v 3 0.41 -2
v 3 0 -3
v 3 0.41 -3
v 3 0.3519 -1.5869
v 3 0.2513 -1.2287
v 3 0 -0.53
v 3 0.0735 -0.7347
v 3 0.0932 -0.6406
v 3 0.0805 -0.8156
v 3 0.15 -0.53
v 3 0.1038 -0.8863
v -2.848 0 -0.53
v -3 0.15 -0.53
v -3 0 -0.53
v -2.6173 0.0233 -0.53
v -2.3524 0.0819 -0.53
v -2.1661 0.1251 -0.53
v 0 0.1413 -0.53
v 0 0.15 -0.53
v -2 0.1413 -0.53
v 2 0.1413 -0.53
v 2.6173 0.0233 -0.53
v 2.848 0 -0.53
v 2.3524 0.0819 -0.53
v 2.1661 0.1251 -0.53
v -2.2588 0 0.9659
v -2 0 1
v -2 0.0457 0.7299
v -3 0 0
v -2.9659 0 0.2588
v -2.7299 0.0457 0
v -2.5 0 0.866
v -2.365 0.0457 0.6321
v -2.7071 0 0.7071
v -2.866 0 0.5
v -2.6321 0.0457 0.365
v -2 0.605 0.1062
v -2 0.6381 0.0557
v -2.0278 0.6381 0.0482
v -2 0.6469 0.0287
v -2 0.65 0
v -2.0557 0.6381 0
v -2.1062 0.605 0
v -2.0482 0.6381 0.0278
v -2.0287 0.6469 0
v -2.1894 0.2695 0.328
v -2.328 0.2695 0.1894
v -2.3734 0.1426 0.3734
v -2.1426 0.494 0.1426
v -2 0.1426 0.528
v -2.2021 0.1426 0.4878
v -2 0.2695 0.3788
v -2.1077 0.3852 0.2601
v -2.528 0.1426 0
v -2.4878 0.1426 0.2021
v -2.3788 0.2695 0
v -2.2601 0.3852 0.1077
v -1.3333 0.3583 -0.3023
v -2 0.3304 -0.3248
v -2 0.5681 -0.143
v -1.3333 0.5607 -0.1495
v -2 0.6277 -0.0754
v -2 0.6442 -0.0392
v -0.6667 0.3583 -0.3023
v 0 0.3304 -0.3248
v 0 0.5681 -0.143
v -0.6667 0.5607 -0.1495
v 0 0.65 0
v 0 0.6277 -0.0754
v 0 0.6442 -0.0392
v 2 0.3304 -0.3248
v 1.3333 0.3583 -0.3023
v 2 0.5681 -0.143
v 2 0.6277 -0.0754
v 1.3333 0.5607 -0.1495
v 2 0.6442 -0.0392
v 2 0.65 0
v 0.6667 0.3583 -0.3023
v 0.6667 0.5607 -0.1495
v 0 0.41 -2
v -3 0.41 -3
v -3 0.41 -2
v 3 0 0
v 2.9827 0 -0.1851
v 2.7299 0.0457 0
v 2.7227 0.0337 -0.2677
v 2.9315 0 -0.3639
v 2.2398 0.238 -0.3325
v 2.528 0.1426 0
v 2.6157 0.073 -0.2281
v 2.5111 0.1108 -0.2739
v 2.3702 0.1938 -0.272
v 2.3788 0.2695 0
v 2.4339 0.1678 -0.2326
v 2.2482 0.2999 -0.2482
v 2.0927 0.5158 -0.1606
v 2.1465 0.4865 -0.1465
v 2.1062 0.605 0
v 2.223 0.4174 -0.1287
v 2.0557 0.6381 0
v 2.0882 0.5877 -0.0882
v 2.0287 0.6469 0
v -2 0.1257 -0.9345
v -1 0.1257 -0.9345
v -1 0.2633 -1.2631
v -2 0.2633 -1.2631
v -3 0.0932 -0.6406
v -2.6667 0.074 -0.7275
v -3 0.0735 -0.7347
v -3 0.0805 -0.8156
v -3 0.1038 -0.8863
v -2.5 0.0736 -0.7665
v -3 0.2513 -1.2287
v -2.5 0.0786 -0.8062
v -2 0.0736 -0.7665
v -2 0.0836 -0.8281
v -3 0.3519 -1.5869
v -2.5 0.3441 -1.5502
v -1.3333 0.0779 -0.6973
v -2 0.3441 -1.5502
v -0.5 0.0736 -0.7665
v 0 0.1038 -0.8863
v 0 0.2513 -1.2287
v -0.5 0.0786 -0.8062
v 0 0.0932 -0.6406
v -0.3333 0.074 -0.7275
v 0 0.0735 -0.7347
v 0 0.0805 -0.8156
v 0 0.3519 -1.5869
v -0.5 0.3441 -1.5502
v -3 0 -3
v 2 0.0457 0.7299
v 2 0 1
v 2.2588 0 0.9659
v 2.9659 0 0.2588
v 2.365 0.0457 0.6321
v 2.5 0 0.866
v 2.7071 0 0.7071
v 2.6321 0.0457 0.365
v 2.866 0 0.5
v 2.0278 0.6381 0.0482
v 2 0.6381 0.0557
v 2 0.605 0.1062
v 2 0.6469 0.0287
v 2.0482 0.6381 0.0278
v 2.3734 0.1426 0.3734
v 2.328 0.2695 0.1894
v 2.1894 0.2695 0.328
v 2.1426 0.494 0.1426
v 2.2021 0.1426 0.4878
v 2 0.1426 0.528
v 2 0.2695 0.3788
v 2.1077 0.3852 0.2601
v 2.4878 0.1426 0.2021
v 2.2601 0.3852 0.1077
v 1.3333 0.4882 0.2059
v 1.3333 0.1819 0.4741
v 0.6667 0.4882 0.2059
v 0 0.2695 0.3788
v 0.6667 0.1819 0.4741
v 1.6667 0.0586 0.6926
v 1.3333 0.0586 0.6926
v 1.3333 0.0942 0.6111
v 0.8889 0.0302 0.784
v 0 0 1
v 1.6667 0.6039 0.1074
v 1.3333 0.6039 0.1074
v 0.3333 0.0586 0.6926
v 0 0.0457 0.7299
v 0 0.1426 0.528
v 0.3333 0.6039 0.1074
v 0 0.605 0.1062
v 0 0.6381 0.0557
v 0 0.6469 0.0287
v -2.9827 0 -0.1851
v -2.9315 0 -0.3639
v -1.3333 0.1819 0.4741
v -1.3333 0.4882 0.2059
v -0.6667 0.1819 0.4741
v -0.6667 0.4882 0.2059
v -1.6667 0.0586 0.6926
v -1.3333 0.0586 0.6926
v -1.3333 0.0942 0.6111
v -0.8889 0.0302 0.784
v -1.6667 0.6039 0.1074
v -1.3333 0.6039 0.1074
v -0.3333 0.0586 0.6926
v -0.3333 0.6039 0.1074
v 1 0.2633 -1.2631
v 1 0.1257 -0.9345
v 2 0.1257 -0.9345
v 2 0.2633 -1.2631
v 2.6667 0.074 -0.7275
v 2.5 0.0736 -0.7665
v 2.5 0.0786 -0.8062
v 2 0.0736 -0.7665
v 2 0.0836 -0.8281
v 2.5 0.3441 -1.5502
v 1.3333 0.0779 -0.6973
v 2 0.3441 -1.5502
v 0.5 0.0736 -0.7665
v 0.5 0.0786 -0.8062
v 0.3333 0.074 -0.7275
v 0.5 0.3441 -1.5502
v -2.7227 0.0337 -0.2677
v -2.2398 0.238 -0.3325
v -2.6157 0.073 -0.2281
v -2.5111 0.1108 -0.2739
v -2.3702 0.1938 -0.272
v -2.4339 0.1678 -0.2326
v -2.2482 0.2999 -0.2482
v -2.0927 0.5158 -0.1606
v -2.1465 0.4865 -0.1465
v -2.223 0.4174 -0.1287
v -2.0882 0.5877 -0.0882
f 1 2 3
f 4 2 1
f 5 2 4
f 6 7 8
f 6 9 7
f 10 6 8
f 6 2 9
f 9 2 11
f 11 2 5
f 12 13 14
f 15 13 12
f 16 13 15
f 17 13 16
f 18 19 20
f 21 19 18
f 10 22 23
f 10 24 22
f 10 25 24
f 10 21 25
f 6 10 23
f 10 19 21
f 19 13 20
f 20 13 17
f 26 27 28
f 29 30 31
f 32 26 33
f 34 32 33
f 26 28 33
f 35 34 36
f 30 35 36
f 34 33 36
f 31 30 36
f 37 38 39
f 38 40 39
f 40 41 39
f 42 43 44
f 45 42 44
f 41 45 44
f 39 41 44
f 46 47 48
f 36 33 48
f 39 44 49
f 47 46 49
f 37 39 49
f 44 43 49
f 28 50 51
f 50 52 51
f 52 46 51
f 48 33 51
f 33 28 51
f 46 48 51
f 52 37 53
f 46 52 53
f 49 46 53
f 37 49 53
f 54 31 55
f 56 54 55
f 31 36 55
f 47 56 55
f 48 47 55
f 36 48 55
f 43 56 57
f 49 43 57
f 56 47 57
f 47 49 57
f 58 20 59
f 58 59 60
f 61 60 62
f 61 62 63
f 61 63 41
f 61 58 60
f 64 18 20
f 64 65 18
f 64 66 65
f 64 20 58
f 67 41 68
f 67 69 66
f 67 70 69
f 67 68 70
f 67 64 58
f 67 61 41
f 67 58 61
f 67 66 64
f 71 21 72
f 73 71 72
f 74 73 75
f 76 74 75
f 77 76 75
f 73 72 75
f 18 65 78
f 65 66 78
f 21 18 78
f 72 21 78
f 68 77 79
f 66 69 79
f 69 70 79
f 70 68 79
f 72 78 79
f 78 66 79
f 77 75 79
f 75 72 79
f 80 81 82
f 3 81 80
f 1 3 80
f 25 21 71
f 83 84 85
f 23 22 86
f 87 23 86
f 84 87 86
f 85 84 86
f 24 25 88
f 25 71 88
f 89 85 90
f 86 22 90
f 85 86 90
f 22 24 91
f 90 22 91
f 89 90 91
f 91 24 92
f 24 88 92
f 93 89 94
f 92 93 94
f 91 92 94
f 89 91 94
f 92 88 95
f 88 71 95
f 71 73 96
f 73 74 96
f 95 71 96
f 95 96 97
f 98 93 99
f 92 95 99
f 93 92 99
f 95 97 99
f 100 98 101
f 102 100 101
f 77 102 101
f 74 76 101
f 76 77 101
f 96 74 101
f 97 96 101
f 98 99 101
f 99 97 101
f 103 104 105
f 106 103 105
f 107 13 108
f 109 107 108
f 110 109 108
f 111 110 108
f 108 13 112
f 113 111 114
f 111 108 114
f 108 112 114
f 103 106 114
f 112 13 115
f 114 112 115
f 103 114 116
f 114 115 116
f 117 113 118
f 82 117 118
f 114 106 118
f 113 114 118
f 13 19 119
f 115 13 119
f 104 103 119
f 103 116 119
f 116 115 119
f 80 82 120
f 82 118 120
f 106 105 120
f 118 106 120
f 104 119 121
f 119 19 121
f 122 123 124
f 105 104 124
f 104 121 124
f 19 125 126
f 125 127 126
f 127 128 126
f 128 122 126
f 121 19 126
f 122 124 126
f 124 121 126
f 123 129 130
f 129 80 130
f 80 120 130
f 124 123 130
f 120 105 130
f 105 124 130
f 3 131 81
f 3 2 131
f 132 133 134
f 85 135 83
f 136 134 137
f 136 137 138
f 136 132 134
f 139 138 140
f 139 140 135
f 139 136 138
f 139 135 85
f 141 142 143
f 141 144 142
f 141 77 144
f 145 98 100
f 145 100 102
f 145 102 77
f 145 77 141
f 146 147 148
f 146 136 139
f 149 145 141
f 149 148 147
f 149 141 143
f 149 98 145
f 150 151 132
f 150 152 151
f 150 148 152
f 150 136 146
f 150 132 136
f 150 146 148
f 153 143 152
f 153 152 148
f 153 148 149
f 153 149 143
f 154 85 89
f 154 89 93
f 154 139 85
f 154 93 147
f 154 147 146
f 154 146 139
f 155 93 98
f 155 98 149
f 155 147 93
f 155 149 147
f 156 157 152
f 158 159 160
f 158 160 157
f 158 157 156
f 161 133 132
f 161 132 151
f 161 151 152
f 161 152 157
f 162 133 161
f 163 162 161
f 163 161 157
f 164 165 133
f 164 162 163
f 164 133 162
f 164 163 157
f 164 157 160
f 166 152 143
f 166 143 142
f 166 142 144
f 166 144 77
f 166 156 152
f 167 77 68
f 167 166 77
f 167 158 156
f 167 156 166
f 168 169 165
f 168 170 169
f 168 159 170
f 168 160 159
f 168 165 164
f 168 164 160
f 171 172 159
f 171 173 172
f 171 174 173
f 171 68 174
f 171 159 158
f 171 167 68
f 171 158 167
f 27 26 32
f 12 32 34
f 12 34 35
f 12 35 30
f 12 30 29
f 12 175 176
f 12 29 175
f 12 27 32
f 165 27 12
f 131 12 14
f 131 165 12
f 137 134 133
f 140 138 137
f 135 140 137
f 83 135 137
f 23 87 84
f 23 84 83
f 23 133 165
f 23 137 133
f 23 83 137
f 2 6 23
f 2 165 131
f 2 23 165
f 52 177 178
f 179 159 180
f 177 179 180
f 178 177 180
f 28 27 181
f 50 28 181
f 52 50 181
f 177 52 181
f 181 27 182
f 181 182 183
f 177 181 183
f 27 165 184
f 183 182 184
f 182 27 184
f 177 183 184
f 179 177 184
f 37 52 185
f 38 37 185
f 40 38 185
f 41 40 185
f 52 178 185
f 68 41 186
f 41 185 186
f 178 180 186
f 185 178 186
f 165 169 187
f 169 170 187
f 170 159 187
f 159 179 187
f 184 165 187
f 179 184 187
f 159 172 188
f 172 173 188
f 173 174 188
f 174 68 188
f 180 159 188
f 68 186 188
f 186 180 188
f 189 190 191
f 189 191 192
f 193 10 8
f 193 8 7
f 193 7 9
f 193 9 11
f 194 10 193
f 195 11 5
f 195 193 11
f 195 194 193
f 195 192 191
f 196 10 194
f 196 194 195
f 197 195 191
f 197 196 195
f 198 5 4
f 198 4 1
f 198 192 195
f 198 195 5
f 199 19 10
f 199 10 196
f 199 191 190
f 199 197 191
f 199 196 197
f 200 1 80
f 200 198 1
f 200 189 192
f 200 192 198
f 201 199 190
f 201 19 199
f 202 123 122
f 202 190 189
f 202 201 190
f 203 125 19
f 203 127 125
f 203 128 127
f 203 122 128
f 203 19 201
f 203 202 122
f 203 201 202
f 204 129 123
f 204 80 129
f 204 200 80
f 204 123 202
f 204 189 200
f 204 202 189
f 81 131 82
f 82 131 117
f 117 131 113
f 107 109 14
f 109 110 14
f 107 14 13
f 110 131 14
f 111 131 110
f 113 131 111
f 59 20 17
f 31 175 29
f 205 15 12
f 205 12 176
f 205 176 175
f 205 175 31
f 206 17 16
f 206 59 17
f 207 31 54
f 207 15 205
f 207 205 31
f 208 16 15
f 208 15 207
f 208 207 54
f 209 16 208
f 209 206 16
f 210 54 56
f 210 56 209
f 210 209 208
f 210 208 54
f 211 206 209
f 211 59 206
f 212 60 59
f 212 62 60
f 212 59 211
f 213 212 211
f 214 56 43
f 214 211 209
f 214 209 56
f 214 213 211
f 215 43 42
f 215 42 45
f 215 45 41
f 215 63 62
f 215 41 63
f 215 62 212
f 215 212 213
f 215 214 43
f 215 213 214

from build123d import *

# Parameters (mm, degrees)
PAD001_DEPTH              = 3
PAD001_DEPTH_BACK         = 3
REVOLUTION_ANGLE          = -90
PAD_DEPTH                 = 2
FUSION002_PLACEMENT_ANGLE = 90


with BuildPart() as body002:
    # Sketch002 → Pad001 (new body, two sides)
    with BuildSketch(Plane.YZ) as pad001_sk:
        with BuildLine():
            Line((0, -3), (0.41, -3))
            Line((0.41, -3), (0.41, -2))
            add(Edge.make_bspline(
                [(0.15, -0.53), (0.02526, -0.71971), (0.132942, -0.952639), (0.251229, -1.193198), (0.378371, -1.633026), (0.41, -2)],
                knots=[0, 0, 0, 0, 0.333333, 0.666667, 1, 1, 1, 1], degree=3))
            Line((0.15, -0.53), (0, -0.53))
            Line((0, -0.53), (0, -3))
        make_face()
    extrude(amount=PAD001_DEPTH)
    extrude(pad001_sk.sketch, amount=-PAD001_DEPTH_BACK)


with BuildPart() as body001:
    # Sketch001 → Revolution (revolve)
    with BuildSketch(Plane.YZ):
        with BuildLine():
            add(Edge.make_bspline(
                [(1, 0), (0.28, 0.03012), (0.24, 0.65), (0, 0.65)],
                knots=[0, 0, 0, 0, 1, 1, 1, 1], degree=3))
            Line((0, 0.65), (0, 0))
            Line((0, 0), (1, 0))
        make_face()
    revolve(axis=Axis((0, 0, 0), (0, 0, 1)), revolution_arc=REVOLUTION_ANGLE)


with BuildPart() as body001_1:
    # Body001 placement: moved
    add(body001.part.moved(Location((2, 0, 0))))


with BuildPart() as fusion:
    # Sketch → Pad (new body)
    with BuildSketch(Plane.YZ):
        with BuildLine():
            add(Edge.make_bspline(
                [(1, 0), (0.28, 0.03012), (0.24, 0.65), (0, 0.65)],
                knots=[0, 0, 0, 0, 1, 1, 1, 1], degree=3))
            Line((0, 0.65), (0, 0))
            Line((0, 0), (1, 0))
        make_face()
    extrude(amount=PAD_DEPTH)

    # Fusion: union Body001
    add(body001_1.part)


with BuildPart() as fusion001:
    # Part__Mirroring: instance of Fusion
    add(fusion.part.mirror(Plane(origin=(0, 0, 0), x_dir=(0, -1, 0), z_dir=(1, 0, 0))))

    # Fusion001: union Fusion
    add(fusion.part)


with BuildPart() as part_mirroring001:
    # Part__Mirroring001: instance of Fusion001
    add(fusion001.part.mirror(Plane(origin=(0, 0, 0), x_dir=(1, 0, 0), z_dir=(0, 1, 0))))


with BuildPart() as fusion003:
    # Fusion002 base: copy of Fusion001
    add(fusion001.part)

    # Fusion002: union Part__Mirroring001
    add(part_mirroring001.part)


with BuildPart() as fusion003_1:
    # Fusion002 placement: moved
    add(fusion003.part.rotate(Axis((0, 0, 0), (-1, 0, 0)), FUSION002_PLACEMENT_ANGLE))

    # Fusion003: union Body002
    add(body002.part)


solid = fusion003_1.part
